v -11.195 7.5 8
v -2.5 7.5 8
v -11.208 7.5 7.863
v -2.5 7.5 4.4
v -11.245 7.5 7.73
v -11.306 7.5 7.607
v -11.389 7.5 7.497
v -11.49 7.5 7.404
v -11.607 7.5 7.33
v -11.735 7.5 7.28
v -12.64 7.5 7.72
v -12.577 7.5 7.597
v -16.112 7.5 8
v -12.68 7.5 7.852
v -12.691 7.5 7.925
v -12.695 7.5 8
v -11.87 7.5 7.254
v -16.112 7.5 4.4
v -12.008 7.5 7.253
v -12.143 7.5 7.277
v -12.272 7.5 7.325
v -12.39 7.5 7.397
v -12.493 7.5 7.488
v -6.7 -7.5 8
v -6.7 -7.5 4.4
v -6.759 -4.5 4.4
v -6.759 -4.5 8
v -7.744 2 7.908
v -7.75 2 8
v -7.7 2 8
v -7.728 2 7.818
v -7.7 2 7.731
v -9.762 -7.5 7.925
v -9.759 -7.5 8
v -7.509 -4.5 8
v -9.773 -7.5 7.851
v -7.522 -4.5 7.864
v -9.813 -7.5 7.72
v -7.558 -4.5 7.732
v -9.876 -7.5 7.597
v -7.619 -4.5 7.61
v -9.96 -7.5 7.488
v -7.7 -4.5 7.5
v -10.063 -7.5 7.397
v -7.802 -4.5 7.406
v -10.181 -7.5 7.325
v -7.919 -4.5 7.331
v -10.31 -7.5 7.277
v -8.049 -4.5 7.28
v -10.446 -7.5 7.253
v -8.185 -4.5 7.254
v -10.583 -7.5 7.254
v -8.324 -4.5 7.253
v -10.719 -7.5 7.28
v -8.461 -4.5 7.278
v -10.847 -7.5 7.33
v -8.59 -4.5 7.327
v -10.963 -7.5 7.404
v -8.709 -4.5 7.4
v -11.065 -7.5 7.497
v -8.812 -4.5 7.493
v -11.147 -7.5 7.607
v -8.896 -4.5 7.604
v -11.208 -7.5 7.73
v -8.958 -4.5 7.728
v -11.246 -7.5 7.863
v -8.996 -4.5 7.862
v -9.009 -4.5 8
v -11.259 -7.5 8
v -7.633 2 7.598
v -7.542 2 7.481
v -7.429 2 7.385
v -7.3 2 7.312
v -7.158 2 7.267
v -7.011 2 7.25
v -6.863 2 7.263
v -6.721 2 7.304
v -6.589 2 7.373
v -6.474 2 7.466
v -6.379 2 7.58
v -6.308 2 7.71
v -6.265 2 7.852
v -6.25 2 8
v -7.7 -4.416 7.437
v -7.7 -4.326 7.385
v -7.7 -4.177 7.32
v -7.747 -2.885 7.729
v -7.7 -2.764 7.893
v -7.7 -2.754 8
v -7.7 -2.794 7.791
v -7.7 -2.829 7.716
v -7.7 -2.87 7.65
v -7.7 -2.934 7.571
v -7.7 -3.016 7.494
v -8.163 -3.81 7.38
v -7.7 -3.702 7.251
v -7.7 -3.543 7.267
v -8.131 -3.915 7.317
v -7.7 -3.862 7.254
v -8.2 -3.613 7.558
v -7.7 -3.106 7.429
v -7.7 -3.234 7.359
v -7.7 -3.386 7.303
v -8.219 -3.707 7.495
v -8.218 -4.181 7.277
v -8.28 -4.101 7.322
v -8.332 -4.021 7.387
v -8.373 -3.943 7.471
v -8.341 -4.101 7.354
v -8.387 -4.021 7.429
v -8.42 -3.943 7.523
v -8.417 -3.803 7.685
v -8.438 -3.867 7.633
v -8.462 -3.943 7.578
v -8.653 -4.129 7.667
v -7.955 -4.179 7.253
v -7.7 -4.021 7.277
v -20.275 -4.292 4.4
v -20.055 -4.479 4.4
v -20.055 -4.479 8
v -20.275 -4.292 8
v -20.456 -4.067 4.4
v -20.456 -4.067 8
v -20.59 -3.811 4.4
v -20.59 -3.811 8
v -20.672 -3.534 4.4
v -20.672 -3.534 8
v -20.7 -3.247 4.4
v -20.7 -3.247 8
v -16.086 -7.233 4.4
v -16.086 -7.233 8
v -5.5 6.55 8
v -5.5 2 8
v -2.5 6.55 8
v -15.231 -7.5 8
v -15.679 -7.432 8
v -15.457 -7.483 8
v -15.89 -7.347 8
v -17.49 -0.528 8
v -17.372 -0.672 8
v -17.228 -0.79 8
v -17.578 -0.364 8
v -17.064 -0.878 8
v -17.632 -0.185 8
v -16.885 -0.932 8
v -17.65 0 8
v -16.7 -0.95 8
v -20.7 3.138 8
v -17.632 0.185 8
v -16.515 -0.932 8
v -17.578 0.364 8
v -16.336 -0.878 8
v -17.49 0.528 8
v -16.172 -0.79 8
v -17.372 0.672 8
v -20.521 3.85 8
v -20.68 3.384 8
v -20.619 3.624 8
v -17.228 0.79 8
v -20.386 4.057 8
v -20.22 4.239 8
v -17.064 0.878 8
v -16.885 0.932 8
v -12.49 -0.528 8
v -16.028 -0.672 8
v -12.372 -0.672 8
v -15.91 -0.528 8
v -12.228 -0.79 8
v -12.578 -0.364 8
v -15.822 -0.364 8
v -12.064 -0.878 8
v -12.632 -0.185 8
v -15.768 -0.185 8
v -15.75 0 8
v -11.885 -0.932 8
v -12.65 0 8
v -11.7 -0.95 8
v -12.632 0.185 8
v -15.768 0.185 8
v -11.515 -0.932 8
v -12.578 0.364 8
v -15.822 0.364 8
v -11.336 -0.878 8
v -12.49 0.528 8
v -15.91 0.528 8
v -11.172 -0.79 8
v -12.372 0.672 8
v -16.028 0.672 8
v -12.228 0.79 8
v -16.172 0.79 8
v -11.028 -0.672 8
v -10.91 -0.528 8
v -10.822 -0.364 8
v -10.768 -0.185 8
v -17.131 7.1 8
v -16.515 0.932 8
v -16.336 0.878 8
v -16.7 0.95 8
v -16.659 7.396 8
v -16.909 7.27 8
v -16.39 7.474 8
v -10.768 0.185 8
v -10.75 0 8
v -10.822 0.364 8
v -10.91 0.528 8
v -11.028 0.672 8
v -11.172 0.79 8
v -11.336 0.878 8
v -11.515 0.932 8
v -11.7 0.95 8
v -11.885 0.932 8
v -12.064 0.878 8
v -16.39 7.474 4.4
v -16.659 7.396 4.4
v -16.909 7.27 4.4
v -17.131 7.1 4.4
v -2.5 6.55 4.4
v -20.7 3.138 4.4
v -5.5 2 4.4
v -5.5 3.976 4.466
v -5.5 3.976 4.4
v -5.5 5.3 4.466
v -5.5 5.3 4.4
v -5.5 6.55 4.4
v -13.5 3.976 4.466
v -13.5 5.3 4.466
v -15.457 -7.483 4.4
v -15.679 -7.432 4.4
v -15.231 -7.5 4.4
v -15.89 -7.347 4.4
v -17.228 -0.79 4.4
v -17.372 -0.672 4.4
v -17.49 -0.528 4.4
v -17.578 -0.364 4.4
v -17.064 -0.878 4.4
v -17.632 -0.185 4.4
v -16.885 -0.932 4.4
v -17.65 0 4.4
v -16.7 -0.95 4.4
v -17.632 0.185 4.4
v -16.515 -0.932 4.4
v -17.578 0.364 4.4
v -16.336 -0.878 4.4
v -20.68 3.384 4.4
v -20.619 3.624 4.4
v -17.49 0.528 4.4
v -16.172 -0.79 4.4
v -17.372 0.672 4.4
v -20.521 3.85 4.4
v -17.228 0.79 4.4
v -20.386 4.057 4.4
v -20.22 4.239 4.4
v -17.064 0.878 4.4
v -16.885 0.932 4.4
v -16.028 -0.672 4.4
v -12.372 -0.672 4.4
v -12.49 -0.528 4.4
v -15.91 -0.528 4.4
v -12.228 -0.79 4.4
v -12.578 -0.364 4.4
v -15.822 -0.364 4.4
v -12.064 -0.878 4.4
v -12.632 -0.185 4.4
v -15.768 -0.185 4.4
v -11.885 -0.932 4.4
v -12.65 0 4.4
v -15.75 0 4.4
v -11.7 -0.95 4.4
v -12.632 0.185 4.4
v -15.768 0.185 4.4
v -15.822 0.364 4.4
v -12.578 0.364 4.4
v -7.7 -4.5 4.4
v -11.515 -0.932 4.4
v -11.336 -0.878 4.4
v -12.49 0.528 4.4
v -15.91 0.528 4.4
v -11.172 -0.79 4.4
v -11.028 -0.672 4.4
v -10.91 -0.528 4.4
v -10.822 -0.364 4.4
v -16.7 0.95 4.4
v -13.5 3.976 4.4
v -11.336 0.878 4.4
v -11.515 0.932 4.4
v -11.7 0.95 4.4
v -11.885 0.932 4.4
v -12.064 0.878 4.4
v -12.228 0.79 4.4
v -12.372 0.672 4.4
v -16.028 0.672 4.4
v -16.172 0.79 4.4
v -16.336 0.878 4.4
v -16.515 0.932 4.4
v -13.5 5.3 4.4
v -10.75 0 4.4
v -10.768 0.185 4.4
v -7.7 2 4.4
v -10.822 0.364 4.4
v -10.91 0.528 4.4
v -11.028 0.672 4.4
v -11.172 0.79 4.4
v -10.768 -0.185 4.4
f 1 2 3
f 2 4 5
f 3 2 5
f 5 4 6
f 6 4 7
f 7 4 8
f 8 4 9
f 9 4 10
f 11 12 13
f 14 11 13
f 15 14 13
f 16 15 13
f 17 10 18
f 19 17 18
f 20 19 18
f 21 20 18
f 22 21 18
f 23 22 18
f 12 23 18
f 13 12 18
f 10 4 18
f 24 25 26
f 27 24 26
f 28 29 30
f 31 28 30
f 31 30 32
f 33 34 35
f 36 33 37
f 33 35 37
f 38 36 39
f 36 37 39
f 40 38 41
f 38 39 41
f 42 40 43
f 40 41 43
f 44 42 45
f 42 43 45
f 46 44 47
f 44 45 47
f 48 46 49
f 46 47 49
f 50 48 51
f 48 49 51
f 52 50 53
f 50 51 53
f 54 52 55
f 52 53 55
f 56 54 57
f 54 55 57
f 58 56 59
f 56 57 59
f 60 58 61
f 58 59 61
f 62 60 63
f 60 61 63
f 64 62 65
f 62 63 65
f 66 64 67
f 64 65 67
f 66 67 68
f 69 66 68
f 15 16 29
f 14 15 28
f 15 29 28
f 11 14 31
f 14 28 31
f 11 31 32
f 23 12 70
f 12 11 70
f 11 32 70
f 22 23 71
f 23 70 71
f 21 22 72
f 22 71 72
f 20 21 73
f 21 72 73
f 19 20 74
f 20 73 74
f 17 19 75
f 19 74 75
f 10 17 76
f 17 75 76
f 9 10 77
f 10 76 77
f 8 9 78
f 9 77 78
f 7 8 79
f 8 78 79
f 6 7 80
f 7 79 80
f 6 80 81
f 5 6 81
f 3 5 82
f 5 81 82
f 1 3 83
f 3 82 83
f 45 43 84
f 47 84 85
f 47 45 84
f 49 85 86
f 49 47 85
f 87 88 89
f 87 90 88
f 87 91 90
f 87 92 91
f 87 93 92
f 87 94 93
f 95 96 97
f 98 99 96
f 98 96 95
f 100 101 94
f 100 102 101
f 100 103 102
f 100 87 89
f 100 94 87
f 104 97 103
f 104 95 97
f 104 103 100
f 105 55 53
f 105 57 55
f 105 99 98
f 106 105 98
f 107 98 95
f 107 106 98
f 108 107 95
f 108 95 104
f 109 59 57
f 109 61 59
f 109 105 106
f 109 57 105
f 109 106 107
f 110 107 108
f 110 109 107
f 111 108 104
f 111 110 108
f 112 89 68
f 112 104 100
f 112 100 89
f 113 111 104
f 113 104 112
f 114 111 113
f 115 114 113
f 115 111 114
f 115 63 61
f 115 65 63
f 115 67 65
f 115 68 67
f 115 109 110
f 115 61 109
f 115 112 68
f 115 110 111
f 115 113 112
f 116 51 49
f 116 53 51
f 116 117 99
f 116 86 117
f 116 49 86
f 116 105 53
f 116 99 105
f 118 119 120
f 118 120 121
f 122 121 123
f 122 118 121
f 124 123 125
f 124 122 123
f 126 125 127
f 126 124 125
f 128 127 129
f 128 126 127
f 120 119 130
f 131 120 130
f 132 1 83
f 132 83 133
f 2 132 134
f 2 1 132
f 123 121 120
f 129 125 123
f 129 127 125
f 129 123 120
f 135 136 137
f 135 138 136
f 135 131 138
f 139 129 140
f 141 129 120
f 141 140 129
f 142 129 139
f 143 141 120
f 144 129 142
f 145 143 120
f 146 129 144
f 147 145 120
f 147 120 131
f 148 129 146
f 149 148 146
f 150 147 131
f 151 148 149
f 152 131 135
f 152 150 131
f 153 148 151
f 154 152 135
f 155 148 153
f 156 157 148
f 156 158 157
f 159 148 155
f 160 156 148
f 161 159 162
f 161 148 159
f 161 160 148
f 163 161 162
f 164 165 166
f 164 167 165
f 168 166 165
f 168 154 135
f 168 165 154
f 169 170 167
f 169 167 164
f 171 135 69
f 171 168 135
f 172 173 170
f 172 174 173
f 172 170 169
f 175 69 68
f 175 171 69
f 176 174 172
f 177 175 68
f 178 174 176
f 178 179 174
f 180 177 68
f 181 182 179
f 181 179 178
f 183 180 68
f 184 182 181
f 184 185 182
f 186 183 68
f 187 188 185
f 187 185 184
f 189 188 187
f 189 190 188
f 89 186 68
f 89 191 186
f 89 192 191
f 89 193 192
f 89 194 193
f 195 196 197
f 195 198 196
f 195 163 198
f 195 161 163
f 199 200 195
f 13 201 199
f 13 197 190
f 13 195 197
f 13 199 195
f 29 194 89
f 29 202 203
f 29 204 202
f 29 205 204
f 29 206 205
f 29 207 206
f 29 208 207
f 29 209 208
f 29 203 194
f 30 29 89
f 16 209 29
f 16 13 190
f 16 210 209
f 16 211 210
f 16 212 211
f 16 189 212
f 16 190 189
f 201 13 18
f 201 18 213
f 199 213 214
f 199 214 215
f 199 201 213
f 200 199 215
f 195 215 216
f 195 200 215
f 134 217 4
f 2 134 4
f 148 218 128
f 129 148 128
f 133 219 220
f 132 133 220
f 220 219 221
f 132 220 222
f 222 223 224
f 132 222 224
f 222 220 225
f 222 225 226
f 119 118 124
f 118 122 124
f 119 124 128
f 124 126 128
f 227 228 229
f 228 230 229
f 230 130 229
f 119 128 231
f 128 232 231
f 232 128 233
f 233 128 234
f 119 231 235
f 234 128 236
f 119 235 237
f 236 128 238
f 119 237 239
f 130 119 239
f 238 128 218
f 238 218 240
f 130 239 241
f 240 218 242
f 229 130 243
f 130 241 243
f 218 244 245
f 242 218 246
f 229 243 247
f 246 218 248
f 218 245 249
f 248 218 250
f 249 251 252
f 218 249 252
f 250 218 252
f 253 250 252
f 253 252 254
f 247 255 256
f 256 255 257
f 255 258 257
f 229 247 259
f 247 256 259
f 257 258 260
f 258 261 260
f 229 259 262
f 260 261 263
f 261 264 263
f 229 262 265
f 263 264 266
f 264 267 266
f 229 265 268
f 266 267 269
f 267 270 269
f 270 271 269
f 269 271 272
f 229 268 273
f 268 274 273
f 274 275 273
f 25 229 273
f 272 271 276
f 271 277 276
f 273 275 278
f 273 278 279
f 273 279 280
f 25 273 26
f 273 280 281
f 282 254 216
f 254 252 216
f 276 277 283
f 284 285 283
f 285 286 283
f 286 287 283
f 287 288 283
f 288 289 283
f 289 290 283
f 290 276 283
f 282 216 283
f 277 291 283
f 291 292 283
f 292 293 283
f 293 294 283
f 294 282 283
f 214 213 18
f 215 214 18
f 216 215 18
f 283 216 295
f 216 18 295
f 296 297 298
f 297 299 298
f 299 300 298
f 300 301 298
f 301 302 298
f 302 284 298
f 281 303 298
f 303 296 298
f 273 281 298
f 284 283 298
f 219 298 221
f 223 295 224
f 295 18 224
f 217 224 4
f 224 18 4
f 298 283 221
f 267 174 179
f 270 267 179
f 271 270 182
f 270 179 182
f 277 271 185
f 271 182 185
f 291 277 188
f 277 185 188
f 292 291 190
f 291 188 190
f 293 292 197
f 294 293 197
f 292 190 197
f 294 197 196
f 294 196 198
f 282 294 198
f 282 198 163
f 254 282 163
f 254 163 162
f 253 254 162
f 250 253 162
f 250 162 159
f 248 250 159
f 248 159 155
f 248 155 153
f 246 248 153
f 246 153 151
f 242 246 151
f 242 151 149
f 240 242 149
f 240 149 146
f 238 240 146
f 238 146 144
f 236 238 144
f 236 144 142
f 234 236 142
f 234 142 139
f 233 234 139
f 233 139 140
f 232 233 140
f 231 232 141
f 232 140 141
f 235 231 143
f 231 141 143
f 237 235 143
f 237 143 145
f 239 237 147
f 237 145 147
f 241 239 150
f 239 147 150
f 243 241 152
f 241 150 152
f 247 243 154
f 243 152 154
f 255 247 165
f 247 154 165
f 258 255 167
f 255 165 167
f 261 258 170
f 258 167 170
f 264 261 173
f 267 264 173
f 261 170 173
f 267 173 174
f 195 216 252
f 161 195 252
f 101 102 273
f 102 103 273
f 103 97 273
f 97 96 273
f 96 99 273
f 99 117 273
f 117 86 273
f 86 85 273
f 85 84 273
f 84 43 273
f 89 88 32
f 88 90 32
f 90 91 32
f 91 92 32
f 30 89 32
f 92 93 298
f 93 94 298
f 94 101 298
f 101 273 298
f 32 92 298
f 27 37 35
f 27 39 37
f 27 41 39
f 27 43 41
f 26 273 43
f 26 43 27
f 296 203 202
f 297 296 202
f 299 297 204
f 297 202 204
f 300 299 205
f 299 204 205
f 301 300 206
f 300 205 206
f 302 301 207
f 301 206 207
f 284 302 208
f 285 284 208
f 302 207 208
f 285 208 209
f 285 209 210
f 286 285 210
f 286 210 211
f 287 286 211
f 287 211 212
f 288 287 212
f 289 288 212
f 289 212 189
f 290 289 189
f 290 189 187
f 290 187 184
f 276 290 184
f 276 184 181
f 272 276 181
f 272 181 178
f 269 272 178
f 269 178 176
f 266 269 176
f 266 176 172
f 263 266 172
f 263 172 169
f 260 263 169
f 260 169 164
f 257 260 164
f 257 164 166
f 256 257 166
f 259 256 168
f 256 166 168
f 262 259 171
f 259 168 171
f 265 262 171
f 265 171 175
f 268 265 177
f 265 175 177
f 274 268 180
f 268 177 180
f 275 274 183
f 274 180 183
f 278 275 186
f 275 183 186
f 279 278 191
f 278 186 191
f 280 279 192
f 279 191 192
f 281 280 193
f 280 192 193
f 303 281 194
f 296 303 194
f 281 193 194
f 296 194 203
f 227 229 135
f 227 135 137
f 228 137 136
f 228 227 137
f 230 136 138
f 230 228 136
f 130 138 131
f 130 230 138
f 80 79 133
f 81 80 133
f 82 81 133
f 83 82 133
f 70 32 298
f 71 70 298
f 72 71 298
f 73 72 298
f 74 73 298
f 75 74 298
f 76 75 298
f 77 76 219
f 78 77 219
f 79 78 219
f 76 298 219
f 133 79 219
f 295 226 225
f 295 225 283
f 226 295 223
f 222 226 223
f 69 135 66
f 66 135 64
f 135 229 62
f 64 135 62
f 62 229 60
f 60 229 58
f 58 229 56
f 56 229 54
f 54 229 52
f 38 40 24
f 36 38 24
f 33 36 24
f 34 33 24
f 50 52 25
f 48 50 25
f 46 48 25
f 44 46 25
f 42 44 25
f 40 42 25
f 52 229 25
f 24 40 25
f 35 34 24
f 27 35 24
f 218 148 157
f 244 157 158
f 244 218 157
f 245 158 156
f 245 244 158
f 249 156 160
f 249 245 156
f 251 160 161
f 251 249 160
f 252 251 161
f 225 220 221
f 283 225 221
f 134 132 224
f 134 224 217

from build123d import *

# Parameters (mm, degrees)
BOSS_EXTRUDE1_DEPTH      = 2
BOSS_EXTRUDE2_DEPTH      = 6
SKETCH24_R               = 3.9
BOSS_EXTRUDE5_DEPTH      = 2.3
SKETCH30_W               = 2.408612022
SKETCH30_H               = 1.324178481
CUT_EXTRUDE12_DEPTH      = 8
CUT_EXTRUDE11_DEPTH      = 5.3
FILLET1_R                = 1.5
SKETCH34_R               = 0.75
CUT_EXTRUDE13_DEPTH      = 8
SKETCH35_R               = 0.75
CUT_EXTRUDE14_DEPTH      = 3
CUT_EXTRUDE14_DEPTH_BACK = 8
SKETCH36_R               = 0.95
CUT_EXTRUDE15_DEPTH      = 8
SKETCH37_R               = 2
CUT_EXTRUDE16_DEPTH      = 2.5
SKETCH38_W               = 3
SKETCH38_H               = 1.25
CUT_EXTRUDE17_DEPTH      = 3.6


with BuildPart() as part:
    # Sketch2 → Boss-Extrude1 (new body)
    with BuildSketch(Plane.XY):
        with BuildLine():
            Line((-2.5, 7.5), (-16.7, 7.5))
            Line((-16.7, 7.5), (-20.7, 3.793442666))
            Line((-20.7, 3.793442666), (-20.7, -4.031648778))
            Line((-20.7, -4.031648778), (-15.7, -7.5))
            Line((-15.7, -7.5), (-6.7, -7.5))
            Line((-6.7, -7.5), (-4.2, -5.6))
            ThreePointArc((-4.2, -5.6), (3.130495168, -6.260990337), (7, 0))
            ThreePointArc((7, 0), (4.949747468, 4.949747468), (0, 7))
            Line((0, 7), (0, 7.5))
            Line((0, 7.5), (-2.5, 7.5))
        make_face()
    extrude(amount=BOSS_EXTRUDE1_DEPTH)

    # Sketch4 → Boss-Extrude2 (add)
    with BuildSketch(Plane.XY.offset(2)):
        Polygon((-15.7, -7.5), (-6.7, -7.5), (-6.759079174, -4.5), (-7.7, -4.5), (-7.7, 2), (-5.5, 2), (-5.5, 5.3), (-2.5, 5.3), (-2.5, 7.5), (-16.7, 7.5), (-20.7, 3.793442666), (-20.7, -4.031648778), align=None)
    extrude(amount=BOSS_EXTRUDE2_DEPTH)

    # Sketch24 → Boss-Extrude5 (add)
    with BuildSketch(Plane.XY.offset(2)):
        Circle(SKETCH24_R)
    extrude(amount=BOSS_EXTRUDE5_DEPTH)

    # Sketch30 → Cut-Extrude12 (cut)
    with BuildSketch(Plane(origin=(-5.5, 0, 0), x_dir=(0, 0, -1), z_dir=(1, 0, 0))):
        with Locations((-3.261593395, 4.63791076)):
            Rectangle(SKETCH30_W, SKETCH30_H)
    extrude(amount=-CUT_EXTRUDE12_DEPTH, mode=Mode.SUBTRACT)

    # Sketch28 → Cut-Extrude11 (cut, through all)
    with BuildSketch(Plane.XY.offset(4.3)):
        with BuildLine():
            Line((-1, 1.732050808), (-1, -1.732050808))
            ThreePointArc((-1, -1.732050808), (2, 0), (-1, 1.732050808))
        make_face()
    extrude(amount=-CUT_EXTRUDE11_DEPTH, mode=Mode.SUBTRACT)

    # Fillet1
    fillet1_edges = [part.edges().sort_by_distance(p)[0] for p in [
        (-11.2, -7.5, 0),
        (-8.35, 7.5, 0),
        (-18.7, 5.646721333, 0),
        (-18.2, -5.765824389, 0),
        (-20.7, -0.119103056, 0),
        (-15.7, -7.5, 4),
        (-20.7, -4.031648778, 4),
        (-20.7, 3.793442666, 4),
        (-16.7, 7.5, 4),
    ]]
    fillet(fillet1_edges, radius=FILLET1_R)

    # Sketch34 → Cut-Extrude13 (cut, along a direction that is not the sketch's normal)
    with BuildSketch(Plane.XZ.offset(-2)):
        with Locations((-7, 8)):
            Circle(SKETCH34_R)
    extrude(amount=-CUT_EXTRUDE13_DEPTH, dir=(0.668583388, -0.743637179, 0), mode=Mode.SUBTRACT)

    # Sketch35 → Cut-Extrude14 (cut, two sides, along a direction that is not the sketch's normal)
    with BuildSketch(Plane(origin=(0, -4.5, 0), x_dir=(1, 0, 0), z_dir=(0, 1, 0))) as cut_extrude14_sk:
        with Locations((-8.259079174, -8)):
            Circle(SKETCH35_R)
    extrude(amount=CUT_EXTRUDE14_DEPTH, dir=(0.599919418, 0.80006043, 0), mode=Mode.SUBTRACT)
    extrude(cut_extrude14_sk.sketch, amount=-CUT_EXTRUDE14_DEPTH_BACK, dir=(0.599919418, 0.80006043, 0), mode=Mode.SUBTRACT)

    # Sketch36 → Cut-Extrude15 (cut)
    with BuildSketch(Plane.XY.offset(8)):
        with Locations((-11.7, 0)):
            Circle(SKETCH36_R)
        with Locations((-16.7, 0)):
            Circle(SKETCH36_R)
    extrude(amount=-CUT_EXTRUDE15_DEPTH, mode=Mode.SUBTRACT)

    # Sketch37 → Cut-Extrude16 (cut)
    with BuildSketch(Plane(origin=(0, 0, 0), x_dir=(-1, 0, 0), z_dir=(0, 0, -1))):
        with Locations((11.7, 0)):
            Circle(SKETCH37_R)
        with Locations((16.7, 0)):
            Circle(SKETCH37_R)
    extrude(amount=-CUT_EXTRUDE16_DEPTH, mode=Mode.SUBTRACT)

    # Sketch38 → Cut-Extrude17 (cut)
    with BuildSketch(Plane.XY.offset(8)):
        with Locations((-4, 5.925)):
            Rectangle(SKETCH38_W, SKETCH38_H)
    extrude(amount=-CUT_EXTRUDE17_DEPTH, mode=Mode.SUBTRACT)


with BuildPart() as body_2:
    # Split1: the piece on the far side of the plane
    add(part.part)
    split(bisect_by=Plane.XY.offset(4.4), keep=Keep.BOTTOM)


with BuildPart() as part_1:
    add(part.part)

    # Split1
    split(bisect_by=Plane.XY.offset(4.4), keep=Keep.TOP)


solid = part_1.part
